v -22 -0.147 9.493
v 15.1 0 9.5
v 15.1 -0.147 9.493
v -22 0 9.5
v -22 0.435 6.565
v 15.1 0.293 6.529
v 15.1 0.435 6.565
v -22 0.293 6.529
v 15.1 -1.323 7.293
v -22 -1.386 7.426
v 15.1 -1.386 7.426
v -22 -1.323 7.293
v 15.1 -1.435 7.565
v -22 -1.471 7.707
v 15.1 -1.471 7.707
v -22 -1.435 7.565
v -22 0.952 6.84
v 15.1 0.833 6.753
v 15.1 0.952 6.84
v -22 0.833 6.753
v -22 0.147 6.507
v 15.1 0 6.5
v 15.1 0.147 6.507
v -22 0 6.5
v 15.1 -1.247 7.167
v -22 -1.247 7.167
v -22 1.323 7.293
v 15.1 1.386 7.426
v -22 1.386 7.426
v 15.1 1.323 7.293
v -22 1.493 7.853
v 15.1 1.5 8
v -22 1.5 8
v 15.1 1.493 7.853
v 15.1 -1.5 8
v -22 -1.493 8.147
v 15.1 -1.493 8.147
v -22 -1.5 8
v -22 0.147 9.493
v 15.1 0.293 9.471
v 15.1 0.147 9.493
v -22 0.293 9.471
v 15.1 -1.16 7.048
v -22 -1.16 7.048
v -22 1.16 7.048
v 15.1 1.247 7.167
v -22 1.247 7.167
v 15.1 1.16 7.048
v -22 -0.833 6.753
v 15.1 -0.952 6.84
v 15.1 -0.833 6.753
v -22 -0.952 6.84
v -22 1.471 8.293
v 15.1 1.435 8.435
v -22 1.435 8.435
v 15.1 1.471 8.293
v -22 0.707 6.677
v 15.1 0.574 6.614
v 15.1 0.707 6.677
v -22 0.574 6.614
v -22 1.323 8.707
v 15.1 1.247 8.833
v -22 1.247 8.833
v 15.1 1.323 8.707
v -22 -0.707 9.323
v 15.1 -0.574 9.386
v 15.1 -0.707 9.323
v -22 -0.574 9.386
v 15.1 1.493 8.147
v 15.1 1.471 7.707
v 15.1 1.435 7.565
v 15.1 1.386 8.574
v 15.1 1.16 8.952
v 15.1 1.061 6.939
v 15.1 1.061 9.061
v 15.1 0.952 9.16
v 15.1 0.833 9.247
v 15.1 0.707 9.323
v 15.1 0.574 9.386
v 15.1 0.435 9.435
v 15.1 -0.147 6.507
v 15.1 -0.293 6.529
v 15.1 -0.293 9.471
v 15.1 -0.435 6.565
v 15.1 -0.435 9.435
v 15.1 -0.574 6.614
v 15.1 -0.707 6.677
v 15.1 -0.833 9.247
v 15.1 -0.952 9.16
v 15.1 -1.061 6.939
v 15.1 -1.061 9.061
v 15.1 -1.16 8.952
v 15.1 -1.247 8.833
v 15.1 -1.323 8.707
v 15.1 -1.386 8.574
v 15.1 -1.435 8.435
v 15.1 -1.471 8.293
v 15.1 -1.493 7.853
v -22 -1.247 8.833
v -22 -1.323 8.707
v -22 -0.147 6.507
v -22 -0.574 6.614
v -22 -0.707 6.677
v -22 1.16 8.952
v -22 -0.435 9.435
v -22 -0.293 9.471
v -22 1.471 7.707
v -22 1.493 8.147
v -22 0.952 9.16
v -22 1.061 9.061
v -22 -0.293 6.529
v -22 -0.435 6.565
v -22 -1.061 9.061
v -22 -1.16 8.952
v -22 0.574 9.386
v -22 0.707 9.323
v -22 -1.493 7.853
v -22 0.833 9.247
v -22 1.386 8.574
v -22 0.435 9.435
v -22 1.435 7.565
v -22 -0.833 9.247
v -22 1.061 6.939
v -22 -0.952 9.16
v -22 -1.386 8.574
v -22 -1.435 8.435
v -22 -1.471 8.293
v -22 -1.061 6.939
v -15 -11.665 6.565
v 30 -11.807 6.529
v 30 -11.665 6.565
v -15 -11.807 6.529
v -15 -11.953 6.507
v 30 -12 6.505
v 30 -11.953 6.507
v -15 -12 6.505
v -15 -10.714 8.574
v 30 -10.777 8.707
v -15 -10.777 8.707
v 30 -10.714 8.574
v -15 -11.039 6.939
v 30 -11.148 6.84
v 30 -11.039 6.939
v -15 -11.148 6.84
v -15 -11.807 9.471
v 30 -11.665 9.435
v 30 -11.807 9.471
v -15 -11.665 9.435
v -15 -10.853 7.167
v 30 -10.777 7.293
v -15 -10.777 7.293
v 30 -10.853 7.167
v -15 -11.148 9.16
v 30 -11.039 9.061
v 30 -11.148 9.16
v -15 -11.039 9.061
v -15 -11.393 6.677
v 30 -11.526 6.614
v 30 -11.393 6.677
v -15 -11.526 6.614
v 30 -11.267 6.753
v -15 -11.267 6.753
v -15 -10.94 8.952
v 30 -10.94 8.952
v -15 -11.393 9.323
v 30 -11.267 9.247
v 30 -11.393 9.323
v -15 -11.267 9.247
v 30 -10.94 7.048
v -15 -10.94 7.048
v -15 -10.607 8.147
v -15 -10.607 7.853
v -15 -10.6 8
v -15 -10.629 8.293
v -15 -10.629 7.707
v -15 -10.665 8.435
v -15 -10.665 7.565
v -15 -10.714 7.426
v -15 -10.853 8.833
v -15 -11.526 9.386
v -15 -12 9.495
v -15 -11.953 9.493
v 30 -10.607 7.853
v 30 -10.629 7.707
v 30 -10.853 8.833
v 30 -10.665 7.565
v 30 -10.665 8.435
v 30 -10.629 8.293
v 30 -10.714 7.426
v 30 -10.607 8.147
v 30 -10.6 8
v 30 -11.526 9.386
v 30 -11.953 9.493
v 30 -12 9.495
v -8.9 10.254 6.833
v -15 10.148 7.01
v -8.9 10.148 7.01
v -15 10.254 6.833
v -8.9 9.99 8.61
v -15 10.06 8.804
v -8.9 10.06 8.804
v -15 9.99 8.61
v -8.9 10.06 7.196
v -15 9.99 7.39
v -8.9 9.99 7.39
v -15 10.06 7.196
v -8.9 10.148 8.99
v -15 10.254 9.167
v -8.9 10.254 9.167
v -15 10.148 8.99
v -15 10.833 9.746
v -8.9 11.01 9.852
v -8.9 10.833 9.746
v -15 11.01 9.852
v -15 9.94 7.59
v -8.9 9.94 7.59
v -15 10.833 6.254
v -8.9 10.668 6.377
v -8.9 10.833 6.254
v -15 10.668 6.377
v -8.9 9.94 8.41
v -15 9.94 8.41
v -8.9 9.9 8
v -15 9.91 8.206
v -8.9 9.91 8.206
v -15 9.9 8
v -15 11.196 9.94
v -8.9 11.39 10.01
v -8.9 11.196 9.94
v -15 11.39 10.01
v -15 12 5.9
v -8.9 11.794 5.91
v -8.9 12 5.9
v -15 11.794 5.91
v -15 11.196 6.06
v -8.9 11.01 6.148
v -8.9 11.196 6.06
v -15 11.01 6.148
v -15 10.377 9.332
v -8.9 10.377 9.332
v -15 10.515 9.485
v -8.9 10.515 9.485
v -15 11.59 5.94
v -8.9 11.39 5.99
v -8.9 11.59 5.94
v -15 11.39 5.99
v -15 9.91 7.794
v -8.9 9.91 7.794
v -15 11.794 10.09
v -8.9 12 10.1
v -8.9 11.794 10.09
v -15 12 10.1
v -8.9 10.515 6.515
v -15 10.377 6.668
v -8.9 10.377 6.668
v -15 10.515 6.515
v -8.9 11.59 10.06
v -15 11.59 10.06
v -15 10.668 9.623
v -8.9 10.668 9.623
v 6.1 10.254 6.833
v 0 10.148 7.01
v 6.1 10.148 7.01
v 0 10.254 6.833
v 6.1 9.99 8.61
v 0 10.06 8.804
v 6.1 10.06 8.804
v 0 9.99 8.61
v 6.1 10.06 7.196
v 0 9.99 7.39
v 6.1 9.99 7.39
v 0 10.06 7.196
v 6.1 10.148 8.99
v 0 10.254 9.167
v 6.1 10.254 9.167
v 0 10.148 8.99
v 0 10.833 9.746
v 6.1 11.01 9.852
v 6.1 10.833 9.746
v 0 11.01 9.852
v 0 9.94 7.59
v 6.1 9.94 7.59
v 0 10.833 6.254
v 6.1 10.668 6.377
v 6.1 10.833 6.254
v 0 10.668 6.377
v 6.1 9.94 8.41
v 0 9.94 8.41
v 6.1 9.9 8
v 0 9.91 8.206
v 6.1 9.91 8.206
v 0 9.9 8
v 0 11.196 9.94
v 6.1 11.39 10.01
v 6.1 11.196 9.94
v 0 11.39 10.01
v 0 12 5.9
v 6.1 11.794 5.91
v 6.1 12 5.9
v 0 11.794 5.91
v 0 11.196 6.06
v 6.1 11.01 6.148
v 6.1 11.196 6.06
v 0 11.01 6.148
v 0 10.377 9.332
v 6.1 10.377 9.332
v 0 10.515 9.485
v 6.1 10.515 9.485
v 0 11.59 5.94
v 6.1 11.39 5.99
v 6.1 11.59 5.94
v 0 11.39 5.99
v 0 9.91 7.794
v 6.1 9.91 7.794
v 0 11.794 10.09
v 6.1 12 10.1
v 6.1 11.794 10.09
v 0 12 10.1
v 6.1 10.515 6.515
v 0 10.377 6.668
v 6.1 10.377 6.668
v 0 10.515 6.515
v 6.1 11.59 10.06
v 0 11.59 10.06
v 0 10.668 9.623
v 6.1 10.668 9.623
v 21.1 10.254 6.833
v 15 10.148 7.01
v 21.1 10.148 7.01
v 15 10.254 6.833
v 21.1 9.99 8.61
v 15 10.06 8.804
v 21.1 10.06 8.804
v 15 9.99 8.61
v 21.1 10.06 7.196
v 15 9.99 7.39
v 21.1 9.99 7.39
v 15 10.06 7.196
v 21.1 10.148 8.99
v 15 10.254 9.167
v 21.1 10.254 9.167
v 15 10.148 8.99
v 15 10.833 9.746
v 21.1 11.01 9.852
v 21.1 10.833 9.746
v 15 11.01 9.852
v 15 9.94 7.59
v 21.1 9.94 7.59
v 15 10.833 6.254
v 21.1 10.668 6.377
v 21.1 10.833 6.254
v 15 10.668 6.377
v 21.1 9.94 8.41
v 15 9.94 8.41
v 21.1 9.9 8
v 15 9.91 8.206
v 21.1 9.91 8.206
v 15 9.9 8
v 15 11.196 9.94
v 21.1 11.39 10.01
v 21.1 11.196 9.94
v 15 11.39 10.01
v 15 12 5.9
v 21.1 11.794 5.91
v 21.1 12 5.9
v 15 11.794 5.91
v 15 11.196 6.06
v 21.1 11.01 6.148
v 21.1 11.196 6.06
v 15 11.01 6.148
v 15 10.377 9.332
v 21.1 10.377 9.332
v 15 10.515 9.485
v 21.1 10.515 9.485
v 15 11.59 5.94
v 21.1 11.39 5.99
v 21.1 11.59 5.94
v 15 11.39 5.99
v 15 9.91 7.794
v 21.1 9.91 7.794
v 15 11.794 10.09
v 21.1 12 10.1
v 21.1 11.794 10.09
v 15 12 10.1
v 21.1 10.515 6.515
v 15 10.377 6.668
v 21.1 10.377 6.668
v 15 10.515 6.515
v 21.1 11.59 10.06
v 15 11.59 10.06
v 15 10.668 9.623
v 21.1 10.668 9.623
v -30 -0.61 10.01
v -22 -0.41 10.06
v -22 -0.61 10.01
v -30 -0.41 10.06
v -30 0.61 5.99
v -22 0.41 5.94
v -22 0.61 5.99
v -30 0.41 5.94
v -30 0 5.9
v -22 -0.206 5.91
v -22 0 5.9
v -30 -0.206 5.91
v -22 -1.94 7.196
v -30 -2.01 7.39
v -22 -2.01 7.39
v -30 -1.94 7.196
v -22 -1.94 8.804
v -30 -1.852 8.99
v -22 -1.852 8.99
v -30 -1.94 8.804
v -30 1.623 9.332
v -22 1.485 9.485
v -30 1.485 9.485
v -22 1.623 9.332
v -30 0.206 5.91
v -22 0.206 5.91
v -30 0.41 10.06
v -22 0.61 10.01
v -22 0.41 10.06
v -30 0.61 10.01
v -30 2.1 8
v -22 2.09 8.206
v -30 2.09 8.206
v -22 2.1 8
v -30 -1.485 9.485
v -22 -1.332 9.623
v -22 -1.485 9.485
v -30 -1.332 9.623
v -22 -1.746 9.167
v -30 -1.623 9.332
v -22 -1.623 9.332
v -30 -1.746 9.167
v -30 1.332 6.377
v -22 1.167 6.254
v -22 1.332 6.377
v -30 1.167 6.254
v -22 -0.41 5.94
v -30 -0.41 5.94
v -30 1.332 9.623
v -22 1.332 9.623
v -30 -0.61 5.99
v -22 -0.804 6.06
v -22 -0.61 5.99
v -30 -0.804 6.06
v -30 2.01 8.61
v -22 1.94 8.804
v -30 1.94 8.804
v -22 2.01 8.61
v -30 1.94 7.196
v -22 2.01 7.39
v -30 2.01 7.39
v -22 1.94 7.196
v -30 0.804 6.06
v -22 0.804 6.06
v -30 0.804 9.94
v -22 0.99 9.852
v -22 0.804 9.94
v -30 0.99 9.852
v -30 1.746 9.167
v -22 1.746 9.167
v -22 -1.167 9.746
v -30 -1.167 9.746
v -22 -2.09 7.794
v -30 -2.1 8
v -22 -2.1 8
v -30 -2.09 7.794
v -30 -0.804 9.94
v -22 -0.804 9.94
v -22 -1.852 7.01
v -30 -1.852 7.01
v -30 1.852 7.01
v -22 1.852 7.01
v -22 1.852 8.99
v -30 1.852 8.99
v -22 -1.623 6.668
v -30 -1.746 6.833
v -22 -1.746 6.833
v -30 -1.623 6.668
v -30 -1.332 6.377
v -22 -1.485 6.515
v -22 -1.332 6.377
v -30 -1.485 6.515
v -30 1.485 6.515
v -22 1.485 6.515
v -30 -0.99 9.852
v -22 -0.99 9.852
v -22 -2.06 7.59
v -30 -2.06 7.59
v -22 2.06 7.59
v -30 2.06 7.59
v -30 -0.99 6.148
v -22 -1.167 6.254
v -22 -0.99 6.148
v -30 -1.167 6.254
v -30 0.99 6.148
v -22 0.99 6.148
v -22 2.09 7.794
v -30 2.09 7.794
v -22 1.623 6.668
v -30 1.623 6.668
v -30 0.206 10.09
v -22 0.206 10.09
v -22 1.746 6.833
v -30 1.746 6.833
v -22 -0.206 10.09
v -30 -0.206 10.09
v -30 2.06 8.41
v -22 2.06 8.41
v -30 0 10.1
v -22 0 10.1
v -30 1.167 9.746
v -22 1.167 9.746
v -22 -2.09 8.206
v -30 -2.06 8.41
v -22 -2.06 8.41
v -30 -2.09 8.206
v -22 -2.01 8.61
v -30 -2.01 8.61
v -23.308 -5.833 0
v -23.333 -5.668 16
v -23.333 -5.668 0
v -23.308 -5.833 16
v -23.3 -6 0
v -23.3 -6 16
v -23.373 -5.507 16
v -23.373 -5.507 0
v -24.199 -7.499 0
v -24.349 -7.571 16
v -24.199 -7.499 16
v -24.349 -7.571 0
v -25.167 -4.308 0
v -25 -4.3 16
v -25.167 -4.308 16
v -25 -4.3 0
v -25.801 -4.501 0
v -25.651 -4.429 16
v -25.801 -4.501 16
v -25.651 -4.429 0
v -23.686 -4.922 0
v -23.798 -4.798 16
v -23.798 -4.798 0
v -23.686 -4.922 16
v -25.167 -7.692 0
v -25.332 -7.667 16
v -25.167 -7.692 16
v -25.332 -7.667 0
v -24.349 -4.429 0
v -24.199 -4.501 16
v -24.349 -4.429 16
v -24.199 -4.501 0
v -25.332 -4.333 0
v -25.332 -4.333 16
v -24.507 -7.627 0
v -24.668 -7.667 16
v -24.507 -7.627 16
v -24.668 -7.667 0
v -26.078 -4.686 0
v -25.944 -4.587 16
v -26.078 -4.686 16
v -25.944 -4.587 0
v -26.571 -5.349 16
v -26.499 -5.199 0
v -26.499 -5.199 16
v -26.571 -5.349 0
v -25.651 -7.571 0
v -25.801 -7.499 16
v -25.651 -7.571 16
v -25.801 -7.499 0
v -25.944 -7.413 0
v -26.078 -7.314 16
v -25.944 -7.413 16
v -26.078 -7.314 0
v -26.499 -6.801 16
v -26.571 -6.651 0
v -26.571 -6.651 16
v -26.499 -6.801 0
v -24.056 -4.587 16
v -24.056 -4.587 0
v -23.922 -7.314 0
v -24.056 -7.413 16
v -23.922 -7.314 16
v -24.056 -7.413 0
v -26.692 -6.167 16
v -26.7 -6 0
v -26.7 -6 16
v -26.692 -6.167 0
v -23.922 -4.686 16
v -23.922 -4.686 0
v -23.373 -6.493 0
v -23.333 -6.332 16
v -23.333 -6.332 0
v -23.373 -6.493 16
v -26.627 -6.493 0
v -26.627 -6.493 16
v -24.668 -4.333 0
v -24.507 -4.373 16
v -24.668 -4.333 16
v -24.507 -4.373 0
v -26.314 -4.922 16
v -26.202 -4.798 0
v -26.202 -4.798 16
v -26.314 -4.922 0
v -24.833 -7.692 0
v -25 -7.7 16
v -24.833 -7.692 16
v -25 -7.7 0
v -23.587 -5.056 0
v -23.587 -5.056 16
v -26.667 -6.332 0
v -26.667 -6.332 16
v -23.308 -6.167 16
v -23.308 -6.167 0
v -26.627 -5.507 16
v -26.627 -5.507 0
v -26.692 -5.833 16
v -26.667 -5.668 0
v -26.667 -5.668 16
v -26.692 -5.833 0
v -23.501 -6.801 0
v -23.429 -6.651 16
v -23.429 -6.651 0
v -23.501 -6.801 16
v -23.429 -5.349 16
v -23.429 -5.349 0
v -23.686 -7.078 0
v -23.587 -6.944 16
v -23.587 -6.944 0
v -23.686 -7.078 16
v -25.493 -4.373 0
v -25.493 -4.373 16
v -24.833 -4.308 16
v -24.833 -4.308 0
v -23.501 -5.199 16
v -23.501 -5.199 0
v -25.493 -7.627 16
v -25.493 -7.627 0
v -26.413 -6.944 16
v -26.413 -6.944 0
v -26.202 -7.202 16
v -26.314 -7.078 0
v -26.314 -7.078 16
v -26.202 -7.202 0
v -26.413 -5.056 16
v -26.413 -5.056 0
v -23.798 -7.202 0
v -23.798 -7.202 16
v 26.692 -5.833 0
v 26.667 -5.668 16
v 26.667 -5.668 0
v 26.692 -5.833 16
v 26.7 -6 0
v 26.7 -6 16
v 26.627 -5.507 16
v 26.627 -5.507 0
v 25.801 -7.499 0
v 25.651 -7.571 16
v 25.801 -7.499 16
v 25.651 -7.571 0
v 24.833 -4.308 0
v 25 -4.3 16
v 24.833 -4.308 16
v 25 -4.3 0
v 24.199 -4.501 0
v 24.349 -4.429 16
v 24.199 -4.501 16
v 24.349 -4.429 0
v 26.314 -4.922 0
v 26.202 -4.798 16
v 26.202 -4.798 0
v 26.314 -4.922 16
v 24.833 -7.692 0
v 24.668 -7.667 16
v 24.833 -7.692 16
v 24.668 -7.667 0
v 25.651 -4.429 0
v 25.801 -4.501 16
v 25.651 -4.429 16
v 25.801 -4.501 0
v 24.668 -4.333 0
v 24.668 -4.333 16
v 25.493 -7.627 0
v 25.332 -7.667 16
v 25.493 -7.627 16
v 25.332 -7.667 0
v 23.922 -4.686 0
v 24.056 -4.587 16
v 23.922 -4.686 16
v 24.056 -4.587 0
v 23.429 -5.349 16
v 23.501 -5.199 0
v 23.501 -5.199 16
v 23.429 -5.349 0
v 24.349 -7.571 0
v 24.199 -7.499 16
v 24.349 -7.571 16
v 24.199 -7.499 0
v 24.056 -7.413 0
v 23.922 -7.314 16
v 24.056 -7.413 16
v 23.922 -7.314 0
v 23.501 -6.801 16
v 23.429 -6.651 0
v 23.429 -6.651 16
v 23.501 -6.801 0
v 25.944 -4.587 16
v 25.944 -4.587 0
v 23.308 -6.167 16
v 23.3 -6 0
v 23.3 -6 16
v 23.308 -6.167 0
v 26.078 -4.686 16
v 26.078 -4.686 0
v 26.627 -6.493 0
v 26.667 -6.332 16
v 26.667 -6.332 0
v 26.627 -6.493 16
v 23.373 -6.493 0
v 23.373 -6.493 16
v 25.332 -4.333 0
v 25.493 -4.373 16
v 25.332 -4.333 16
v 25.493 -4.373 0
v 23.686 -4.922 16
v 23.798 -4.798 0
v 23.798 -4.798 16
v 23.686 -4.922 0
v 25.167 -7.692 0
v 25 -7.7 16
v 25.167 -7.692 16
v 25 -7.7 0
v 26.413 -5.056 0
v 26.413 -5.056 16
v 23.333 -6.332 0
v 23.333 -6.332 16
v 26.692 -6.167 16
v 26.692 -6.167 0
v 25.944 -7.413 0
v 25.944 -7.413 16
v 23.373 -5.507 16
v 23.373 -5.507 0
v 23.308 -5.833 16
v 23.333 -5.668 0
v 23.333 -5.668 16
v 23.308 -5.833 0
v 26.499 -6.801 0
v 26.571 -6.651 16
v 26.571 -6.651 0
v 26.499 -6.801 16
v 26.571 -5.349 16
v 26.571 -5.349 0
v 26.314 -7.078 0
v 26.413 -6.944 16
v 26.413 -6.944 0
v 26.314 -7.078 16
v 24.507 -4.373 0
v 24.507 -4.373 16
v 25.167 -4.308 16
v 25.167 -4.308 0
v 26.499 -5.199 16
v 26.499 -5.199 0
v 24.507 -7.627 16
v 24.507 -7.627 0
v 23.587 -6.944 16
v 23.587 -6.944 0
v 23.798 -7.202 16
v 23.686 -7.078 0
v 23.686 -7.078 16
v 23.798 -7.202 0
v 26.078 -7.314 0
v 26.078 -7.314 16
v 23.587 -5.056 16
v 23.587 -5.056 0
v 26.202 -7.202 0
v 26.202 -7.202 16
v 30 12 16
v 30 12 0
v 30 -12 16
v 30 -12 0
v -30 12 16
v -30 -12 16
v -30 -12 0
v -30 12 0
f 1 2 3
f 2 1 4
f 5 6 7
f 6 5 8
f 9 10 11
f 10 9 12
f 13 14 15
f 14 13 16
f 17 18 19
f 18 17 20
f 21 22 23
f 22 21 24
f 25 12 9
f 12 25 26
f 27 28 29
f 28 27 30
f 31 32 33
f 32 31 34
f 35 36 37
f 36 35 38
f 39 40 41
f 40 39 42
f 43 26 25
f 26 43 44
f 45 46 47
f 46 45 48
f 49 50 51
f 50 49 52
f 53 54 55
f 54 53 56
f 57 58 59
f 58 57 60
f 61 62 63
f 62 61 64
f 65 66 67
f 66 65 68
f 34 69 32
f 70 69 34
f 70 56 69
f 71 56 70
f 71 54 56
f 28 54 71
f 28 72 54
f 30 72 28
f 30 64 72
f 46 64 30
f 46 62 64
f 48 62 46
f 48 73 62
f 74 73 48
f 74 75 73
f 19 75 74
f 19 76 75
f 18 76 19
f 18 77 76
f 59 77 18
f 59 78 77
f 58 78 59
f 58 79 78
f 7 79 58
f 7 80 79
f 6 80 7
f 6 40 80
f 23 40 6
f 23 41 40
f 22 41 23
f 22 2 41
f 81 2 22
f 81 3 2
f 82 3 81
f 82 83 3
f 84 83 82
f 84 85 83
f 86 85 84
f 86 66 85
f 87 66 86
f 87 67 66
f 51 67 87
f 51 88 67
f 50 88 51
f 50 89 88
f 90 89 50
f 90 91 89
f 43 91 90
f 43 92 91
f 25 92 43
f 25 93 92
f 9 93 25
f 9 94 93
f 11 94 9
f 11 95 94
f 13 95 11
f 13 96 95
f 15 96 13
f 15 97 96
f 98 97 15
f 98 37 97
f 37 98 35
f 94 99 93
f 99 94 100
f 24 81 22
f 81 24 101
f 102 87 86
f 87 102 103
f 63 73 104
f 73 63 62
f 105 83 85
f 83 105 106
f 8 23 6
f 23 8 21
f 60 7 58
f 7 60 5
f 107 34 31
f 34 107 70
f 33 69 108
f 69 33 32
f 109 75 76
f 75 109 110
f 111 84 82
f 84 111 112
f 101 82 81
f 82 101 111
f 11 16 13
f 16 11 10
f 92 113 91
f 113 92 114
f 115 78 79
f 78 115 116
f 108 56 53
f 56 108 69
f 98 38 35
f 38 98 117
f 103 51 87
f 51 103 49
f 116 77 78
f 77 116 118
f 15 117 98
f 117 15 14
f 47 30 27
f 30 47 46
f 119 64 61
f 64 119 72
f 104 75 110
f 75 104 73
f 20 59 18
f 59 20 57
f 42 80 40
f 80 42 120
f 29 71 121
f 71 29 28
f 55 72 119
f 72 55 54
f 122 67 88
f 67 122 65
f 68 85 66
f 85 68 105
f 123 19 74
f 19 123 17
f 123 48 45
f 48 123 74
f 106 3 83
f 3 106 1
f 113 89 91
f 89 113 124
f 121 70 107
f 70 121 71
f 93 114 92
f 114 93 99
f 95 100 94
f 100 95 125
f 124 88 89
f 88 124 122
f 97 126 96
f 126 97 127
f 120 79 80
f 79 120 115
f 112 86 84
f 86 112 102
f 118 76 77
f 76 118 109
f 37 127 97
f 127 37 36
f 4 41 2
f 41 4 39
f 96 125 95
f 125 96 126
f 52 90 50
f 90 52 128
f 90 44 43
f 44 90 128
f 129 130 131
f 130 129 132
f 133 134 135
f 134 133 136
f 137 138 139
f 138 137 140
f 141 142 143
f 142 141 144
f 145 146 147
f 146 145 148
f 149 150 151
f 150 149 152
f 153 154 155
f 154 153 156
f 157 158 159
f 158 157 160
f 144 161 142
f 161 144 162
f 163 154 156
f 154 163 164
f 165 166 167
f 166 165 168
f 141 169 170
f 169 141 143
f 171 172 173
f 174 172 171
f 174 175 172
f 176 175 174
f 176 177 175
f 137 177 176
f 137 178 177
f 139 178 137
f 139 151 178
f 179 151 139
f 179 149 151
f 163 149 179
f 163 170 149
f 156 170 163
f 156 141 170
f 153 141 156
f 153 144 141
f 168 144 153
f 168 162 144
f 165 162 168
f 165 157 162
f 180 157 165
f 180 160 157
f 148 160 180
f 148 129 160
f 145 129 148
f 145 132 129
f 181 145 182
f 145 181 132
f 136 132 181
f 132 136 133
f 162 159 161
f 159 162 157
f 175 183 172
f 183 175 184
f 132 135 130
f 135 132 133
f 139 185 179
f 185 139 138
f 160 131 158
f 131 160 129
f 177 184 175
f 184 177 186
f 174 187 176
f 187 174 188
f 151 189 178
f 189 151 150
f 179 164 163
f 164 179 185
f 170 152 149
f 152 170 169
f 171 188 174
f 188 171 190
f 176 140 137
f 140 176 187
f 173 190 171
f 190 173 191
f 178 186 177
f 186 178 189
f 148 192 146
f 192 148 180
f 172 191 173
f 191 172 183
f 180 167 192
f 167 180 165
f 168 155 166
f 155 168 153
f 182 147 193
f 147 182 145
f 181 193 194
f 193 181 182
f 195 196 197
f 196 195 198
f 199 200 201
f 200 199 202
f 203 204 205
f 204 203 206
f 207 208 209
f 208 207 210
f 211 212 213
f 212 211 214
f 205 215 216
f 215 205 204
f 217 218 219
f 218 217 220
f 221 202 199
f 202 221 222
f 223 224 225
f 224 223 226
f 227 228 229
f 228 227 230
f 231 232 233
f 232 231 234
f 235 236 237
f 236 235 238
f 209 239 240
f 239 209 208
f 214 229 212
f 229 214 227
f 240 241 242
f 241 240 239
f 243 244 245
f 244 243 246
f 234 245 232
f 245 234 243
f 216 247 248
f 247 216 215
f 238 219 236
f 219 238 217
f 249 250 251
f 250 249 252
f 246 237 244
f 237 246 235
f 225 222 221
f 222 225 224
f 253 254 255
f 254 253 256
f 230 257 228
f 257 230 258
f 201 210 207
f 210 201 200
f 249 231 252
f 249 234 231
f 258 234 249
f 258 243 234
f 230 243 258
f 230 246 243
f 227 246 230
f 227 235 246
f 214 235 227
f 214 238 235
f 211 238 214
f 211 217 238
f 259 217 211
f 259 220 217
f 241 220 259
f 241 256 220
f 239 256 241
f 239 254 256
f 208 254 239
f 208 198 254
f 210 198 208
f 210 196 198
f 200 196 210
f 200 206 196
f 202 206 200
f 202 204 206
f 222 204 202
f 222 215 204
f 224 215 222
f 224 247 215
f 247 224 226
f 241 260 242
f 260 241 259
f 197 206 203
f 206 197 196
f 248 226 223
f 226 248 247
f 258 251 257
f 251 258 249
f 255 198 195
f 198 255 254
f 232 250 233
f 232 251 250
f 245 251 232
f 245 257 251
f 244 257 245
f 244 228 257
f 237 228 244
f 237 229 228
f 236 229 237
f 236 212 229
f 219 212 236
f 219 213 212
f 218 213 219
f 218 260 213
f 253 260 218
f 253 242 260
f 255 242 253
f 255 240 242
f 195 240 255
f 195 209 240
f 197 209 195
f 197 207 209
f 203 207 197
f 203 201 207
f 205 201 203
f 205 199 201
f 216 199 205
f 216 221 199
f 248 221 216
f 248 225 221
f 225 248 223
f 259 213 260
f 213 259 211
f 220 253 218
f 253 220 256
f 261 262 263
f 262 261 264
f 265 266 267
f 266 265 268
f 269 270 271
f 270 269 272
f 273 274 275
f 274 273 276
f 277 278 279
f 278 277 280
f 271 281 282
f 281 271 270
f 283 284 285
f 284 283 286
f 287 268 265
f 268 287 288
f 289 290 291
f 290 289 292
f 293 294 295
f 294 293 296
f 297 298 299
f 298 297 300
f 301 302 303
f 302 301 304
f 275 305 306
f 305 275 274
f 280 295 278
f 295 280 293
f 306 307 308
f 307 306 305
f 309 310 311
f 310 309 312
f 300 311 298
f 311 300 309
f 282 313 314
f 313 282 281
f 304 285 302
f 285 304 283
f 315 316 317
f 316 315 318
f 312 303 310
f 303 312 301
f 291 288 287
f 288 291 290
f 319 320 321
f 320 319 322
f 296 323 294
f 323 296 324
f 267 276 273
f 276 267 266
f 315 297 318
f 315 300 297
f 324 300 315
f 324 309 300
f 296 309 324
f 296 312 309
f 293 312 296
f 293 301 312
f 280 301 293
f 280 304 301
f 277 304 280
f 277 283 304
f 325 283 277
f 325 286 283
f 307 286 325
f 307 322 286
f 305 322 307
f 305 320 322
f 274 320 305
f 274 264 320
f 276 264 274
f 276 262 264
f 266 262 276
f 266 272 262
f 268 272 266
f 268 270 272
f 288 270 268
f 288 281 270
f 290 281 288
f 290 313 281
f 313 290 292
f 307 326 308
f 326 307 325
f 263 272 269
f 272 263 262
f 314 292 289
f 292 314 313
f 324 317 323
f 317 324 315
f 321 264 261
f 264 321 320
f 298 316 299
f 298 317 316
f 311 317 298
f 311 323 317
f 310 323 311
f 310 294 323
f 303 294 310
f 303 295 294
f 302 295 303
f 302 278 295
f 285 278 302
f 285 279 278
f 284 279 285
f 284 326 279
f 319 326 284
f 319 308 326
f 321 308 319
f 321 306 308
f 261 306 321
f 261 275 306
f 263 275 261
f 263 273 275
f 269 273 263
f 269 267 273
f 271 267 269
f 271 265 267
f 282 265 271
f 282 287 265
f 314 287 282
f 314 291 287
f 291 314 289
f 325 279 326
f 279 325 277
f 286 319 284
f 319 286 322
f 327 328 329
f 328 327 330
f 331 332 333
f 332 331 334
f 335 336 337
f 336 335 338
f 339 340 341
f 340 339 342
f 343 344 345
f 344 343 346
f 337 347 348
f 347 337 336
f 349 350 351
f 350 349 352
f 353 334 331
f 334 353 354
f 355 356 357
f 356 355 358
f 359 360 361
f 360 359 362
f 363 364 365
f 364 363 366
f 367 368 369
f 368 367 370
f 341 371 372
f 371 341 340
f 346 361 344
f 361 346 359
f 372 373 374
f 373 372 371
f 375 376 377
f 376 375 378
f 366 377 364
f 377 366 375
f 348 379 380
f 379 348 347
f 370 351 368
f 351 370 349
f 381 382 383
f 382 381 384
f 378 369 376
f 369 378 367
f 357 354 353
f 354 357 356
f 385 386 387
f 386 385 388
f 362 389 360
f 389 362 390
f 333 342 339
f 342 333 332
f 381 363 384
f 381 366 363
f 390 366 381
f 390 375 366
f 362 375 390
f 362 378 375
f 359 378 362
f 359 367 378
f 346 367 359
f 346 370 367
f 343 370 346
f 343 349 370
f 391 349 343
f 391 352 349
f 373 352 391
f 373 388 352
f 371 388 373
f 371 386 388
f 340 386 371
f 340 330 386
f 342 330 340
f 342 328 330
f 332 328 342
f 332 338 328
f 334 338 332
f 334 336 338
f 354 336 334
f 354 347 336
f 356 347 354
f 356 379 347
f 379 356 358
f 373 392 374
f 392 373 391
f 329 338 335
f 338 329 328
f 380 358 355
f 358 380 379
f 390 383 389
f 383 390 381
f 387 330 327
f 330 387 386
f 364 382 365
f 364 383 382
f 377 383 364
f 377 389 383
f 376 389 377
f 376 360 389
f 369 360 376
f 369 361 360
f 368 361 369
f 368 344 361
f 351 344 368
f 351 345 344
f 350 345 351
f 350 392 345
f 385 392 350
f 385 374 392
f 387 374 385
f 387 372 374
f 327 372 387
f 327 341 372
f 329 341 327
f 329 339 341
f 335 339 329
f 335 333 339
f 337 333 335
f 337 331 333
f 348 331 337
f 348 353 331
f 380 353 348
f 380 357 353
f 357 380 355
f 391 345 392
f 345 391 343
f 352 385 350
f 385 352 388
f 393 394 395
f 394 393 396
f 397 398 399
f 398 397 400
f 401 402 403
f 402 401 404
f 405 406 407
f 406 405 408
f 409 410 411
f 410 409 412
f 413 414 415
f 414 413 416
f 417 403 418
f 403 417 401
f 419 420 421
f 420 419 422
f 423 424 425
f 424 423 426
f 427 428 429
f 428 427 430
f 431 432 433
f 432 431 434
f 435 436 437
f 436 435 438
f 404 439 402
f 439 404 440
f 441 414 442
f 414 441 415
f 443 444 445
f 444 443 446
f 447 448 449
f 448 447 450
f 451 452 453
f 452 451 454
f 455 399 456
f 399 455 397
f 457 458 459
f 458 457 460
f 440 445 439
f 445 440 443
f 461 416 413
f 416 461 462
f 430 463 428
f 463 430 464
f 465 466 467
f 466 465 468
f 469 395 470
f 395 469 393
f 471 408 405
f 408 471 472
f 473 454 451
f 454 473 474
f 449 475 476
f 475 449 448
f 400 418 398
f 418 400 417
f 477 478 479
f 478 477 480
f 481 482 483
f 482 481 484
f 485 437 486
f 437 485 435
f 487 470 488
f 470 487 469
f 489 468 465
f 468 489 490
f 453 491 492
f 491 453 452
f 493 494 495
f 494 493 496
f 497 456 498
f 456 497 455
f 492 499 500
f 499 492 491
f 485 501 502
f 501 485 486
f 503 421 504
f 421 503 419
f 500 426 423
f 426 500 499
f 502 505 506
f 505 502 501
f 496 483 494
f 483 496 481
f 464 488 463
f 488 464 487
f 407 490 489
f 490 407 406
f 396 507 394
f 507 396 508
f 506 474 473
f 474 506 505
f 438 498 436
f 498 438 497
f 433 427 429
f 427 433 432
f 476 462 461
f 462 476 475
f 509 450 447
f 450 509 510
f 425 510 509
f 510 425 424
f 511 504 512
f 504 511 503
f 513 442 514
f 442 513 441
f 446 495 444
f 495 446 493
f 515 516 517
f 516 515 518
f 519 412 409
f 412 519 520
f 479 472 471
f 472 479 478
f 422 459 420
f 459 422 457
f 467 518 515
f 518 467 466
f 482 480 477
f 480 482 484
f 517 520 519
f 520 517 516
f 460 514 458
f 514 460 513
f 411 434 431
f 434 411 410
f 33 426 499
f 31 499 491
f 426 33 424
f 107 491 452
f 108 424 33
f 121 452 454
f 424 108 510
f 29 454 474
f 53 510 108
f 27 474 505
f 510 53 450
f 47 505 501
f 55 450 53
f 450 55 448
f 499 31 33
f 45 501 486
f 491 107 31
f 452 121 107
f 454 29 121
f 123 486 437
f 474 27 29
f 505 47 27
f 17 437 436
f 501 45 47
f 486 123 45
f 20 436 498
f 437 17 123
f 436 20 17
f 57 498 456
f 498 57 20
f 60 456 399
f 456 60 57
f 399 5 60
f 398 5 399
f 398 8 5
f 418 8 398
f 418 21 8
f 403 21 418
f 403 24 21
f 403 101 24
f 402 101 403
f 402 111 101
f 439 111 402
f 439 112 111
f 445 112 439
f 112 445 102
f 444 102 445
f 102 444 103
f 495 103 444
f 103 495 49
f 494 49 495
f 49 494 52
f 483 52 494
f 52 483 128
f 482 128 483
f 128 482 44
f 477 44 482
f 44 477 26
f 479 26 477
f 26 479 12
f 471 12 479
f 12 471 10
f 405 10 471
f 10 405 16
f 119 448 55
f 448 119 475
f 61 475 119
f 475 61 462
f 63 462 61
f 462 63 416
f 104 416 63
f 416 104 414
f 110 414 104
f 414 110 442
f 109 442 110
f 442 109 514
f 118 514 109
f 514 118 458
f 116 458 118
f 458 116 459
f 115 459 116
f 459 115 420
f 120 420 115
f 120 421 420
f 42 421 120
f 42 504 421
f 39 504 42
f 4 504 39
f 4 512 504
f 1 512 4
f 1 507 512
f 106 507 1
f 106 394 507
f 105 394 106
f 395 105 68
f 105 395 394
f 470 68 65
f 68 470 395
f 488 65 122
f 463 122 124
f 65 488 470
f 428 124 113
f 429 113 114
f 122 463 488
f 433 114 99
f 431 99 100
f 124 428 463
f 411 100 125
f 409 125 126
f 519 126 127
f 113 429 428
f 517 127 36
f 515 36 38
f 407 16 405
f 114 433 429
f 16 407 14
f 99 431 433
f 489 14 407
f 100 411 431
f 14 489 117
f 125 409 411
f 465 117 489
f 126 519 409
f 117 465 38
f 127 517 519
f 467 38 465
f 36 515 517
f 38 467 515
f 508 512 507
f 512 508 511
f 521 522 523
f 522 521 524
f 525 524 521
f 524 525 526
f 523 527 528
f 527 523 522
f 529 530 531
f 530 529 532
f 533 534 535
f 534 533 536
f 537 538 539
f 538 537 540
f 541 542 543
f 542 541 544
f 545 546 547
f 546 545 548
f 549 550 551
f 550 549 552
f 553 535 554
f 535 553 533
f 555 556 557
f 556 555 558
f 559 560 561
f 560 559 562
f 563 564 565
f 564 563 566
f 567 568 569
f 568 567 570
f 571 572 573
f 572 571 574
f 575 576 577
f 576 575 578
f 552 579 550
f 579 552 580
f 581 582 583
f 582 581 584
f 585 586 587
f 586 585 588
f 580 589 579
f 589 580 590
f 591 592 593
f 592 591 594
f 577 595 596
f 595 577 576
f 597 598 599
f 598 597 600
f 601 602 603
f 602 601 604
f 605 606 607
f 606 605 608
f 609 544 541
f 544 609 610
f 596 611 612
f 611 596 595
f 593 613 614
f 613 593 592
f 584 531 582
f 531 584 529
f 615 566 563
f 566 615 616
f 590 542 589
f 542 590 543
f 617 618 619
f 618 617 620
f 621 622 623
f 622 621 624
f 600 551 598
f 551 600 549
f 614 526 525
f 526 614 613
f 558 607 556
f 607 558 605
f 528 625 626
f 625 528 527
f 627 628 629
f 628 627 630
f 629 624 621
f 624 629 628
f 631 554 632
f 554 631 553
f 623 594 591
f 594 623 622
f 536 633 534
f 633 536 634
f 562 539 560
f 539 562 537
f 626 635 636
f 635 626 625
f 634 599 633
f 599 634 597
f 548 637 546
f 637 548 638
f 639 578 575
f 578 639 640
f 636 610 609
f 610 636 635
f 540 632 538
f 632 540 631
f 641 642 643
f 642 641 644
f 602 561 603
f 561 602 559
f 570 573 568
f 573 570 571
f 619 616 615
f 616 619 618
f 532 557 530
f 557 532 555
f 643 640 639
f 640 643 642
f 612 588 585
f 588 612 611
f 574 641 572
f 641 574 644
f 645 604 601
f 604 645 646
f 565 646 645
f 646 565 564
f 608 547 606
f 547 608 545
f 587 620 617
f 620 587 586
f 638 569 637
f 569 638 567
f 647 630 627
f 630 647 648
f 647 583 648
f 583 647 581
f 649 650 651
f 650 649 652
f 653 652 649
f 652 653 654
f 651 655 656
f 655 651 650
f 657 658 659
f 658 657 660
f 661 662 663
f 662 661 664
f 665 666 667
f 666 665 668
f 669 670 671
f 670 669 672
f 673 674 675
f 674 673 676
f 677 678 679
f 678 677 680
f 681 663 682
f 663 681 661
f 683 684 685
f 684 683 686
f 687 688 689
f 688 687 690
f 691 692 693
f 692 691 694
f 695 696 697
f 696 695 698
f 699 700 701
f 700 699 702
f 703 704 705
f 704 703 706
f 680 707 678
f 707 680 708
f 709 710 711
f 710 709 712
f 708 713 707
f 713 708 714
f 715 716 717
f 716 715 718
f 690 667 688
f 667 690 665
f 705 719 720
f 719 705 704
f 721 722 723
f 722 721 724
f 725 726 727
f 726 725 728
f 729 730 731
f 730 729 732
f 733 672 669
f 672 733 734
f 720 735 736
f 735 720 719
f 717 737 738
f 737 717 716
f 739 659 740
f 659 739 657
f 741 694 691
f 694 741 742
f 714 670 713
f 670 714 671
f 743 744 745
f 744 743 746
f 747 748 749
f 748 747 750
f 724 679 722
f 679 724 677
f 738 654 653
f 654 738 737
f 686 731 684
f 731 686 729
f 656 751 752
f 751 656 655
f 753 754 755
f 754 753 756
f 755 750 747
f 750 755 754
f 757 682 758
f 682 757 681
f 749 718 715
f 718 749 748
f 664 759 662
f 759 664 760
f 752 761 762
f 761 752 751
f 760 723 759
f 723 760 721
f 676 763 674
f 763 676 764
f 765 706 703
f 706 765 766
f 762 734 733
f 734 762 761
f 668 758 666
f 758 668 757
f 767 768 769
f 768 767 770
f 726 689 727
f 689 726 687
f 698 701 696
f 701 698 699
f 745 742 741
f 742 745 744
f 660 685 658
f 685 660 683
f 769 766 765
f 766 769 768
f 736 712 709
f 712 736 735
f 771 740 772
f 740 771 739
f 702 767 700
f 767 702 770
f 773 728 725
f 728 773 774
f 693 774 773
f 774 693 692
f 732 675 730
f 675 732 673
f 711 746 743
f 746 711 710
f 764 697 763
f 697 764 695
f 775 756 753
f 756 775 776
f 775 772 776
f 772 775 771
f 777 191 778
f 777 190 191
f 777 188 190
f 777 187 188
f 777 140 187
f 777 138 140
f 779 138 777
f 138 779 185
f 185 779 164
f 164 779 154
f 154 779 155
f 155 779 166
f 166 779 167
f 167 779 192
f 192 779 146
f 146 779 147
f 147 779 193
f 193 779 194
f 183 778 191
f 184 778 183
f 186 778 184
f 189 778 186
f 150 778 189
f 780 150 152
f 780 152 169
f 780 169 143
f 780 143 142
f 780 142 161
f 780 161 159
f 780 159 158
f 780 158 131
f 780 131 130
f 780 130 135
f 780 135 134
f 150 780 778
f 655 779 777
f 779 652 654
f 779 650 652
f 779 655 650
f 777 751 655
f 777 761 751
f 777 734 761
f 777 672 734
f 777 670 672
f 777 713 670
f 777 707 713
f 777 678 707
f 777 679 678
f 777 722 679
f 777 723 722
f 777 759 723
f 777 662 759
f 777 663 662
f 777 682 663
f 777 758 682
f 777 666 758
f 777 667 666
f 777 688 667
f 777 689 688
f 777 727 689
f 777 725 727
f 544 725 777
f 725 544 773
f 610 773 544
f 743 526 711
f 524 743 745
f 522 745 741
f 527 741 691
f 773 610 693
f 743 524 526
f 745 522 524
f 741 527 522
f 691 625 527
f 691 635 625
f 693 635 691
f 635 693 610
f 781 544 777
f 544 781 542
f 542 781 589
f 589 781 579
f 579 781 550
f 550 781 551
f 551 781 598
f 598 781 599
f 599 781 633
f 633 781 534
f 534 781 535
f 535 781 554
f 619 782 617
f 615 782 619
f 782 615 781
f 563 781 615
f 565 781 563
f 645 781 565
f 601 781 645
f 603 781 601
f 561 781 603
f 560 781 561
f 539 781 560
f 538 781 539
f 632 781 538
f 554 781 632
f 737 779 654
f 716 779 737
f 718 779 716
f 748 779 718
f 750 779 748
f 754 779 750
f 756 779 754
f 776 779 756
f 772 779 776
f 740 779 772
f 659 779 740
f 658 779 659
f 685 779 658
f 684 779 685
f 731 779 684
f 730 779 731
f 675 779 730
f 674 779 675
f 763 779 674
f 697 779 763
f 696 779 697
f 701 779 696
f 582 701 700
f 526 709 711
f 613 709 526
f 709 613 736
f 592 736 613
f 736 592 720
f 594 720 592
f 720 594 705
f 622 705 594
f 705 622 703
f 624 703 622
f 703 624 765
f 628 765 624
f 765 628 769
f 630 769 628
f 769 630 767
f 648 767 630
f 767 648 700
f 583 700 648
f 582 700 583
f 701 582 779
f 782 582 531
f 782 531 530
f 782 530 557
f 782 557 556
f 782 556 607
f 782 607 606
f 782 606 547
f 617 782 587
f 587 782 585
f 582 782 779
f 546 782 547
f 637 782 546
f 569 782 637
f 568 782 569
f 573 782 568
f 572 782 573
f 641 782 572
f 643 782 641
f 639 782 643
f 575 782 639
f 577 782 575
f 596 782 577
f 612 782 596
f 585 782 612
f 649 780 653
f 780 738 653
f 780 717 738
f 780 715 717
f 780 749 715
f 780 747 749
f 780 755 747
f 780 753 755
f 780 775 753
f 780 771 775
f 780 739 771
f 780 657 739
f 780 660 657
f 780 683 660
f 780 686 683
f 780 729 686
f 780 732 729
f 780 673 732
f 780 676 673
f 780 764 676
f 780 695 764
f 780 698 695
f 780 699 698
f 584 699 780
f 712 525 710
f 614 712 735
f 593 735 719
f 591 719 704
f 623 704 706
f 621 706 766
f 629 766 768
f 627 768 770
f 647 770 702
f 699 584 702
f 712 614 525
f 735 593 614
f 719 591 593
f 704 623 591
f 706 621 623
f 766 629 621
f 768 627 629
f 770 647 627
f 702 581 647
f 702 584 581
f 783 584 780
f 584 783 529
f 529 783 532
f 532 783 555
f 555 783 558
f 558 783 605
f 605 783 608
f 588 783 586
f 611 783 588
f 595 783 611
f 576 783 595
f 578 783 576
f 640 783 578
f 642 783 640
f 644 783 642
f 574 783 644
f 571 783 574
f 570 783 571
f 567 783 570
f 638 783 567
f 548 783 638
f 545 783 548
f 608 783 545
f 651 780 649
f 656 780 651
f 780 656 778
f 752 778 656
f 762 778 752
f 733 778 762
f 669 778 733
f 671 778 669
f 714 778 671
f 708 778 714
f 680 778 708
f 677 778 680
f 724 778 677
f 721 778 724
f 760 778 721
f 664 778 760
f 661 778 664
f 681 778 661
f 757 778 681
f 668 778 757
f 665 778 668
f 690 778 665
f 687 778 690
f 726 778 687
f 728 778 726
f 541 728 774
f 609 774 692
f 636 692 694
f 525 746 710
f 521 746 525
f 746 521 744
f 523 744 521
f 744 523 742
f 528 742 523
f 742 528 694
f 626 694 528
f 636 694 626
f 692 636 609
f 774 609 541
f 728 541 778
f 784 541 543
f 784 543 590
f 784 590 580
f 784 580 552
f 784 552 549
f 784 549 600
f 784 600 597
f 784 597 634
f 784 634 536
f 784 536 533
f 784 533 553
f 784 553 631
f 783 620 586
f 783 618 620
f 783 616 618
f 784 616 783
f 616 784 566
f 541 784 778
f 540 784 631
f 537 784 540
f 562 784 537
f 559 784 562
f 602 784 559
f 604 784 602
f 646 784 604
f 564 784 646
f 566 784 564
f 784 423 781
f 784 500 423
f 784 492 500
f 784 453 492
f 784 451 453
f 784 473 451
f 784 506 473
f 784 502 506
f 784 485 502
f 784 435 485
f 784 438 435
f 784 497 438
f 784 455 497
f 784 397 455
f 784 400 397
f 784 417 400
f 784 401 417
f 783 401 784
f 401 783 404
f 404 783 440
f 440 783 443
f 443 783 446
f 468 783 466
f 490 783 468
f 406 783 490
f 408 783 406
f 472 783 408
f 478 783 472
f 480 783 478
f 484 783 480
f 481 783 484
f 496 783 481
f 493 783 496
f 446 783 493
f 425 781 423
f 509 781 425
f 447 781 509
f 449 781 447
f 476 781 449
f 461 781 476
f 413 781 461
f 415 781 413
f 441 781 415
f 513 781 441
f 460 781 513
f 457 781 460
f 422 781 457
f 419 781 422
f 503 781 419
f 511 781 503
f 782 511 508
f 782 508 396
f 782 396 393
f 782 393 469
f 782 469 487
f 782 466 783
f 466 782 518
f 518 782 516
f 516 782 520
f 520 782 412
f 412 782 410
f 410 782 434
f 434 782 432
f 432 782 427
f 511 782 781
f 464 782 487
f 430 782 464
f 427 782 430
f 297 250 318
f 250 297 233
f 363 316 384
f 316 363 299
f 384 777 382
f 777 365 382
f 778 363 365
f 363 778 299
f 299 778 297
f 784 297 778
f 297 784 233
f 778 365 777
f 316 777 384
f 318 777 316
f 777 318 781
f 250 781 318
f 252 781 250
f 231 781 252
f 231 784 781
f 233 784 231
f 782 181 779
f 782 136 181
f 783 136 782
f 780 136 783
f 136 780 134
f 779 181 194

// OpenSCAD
// Manifold block: Splits one tubing line into three.
// Dimensions: 60mm (X) x 24mm (Y) x 16mm (Z)
// Features: 1 inlet, 3 outlets, 1 main internal channel, 2 screw holes.

// --- Dimensions ---
L = 60.0;            // Length (X)
W = 24.0;            // Width (Y)
H = 16.0;            // Height (Z)

channel_d = 3.0;     // Diameter of internal channels
inlet_d = 4.2;       // Diameter of inlet socket
inlet_depth = 8.0;   // Depth of inlet socket
outlet_d = 4.2;      // Diameter of outlet socket
outlet_depth = 6.0;  // Depth of outlet socket

screw_d = 3.4;       // Diameter of M3 screw holes
screw_x_pos = 25.0;  // X position of screw holes
screw_y_pos = -6.0;  // Y position of screw holes

// --- Constants & Setup ---
$fn = 64;
z_mid = H / 2;       // Mid-plane Z = 8

// --- Geometry Construction ---

module block() {
    translate([-L/2, -W/2, 0])
        cube([L, W, H]);
}

module manifold_channels() {
    // Main channel: runs from -X end face to x = 15
    // The -X end face is at x = -30.
    // We use a cylinder oriented along X.
    translate([-L/2 - 0.1, 0, z_mid])
        rotate([0, 90, 0])
            cylinder(h = 15 - (-L/2) + 0.2, d = channel_d);

    // Outlet 1: at x = -15, runs in +Y
    translate([-15, -W/2 - 0.1, z_mid])
        rotate([0, 90, 0])
            cylinder(h = W + 0.2, d = channel_d);

    // Outlet 2: at x = 0, runs in +Y
    translate([0, -W/2 - 0.1, z_mid])
        rotate([0, 90, 0])
            cylinder(h = W + 0.2, d = channel_d);

    // Outlet 3: at x = 15, runs in +Y
    translate([15, -W/2 - 0.1, z_mid])
        rotate([0, 90, 0])
            cylinder(h = W + 0.2, d = channel_d);
}

module sockets() {
    // Inlet socket at -X end face (x = -30), centered on Y (y = 0)
    translate([-L/2 - 0.1, 0, z_mid])
        rotate([0, 90, 0])
            cylinder(h = inlet_depth + 0.1, d = inlet_d);

    // Outlet sockets at +Y face (y = 12)
    // Outlet 1 (x=-15), Outlet 2 (x=0), Outlet 3 (x=15)
    for (sx = [-15, 0, 15]) {
        translate([sx, W/2, z_mid])
            rotate([0, 90, 0])
                cylinder(h = outlet_depth + 0.1, d = outlet_d);
    }
}

module screw_holes() {
    // Two 3.4mm vertical through-holes at x = -25 and 25, y = -6
    for (sx = [-screw_x_pos, screw_x_pos]) {
        translate([sx, screw_y_pos, -0.1])
            cylinder(h = H + 0.2, d = screw_d);
    }
}

// --- Final Assembly ---

difference() {
    block();
    manifold_channels();
    sockets();
    screw_holes();
}
